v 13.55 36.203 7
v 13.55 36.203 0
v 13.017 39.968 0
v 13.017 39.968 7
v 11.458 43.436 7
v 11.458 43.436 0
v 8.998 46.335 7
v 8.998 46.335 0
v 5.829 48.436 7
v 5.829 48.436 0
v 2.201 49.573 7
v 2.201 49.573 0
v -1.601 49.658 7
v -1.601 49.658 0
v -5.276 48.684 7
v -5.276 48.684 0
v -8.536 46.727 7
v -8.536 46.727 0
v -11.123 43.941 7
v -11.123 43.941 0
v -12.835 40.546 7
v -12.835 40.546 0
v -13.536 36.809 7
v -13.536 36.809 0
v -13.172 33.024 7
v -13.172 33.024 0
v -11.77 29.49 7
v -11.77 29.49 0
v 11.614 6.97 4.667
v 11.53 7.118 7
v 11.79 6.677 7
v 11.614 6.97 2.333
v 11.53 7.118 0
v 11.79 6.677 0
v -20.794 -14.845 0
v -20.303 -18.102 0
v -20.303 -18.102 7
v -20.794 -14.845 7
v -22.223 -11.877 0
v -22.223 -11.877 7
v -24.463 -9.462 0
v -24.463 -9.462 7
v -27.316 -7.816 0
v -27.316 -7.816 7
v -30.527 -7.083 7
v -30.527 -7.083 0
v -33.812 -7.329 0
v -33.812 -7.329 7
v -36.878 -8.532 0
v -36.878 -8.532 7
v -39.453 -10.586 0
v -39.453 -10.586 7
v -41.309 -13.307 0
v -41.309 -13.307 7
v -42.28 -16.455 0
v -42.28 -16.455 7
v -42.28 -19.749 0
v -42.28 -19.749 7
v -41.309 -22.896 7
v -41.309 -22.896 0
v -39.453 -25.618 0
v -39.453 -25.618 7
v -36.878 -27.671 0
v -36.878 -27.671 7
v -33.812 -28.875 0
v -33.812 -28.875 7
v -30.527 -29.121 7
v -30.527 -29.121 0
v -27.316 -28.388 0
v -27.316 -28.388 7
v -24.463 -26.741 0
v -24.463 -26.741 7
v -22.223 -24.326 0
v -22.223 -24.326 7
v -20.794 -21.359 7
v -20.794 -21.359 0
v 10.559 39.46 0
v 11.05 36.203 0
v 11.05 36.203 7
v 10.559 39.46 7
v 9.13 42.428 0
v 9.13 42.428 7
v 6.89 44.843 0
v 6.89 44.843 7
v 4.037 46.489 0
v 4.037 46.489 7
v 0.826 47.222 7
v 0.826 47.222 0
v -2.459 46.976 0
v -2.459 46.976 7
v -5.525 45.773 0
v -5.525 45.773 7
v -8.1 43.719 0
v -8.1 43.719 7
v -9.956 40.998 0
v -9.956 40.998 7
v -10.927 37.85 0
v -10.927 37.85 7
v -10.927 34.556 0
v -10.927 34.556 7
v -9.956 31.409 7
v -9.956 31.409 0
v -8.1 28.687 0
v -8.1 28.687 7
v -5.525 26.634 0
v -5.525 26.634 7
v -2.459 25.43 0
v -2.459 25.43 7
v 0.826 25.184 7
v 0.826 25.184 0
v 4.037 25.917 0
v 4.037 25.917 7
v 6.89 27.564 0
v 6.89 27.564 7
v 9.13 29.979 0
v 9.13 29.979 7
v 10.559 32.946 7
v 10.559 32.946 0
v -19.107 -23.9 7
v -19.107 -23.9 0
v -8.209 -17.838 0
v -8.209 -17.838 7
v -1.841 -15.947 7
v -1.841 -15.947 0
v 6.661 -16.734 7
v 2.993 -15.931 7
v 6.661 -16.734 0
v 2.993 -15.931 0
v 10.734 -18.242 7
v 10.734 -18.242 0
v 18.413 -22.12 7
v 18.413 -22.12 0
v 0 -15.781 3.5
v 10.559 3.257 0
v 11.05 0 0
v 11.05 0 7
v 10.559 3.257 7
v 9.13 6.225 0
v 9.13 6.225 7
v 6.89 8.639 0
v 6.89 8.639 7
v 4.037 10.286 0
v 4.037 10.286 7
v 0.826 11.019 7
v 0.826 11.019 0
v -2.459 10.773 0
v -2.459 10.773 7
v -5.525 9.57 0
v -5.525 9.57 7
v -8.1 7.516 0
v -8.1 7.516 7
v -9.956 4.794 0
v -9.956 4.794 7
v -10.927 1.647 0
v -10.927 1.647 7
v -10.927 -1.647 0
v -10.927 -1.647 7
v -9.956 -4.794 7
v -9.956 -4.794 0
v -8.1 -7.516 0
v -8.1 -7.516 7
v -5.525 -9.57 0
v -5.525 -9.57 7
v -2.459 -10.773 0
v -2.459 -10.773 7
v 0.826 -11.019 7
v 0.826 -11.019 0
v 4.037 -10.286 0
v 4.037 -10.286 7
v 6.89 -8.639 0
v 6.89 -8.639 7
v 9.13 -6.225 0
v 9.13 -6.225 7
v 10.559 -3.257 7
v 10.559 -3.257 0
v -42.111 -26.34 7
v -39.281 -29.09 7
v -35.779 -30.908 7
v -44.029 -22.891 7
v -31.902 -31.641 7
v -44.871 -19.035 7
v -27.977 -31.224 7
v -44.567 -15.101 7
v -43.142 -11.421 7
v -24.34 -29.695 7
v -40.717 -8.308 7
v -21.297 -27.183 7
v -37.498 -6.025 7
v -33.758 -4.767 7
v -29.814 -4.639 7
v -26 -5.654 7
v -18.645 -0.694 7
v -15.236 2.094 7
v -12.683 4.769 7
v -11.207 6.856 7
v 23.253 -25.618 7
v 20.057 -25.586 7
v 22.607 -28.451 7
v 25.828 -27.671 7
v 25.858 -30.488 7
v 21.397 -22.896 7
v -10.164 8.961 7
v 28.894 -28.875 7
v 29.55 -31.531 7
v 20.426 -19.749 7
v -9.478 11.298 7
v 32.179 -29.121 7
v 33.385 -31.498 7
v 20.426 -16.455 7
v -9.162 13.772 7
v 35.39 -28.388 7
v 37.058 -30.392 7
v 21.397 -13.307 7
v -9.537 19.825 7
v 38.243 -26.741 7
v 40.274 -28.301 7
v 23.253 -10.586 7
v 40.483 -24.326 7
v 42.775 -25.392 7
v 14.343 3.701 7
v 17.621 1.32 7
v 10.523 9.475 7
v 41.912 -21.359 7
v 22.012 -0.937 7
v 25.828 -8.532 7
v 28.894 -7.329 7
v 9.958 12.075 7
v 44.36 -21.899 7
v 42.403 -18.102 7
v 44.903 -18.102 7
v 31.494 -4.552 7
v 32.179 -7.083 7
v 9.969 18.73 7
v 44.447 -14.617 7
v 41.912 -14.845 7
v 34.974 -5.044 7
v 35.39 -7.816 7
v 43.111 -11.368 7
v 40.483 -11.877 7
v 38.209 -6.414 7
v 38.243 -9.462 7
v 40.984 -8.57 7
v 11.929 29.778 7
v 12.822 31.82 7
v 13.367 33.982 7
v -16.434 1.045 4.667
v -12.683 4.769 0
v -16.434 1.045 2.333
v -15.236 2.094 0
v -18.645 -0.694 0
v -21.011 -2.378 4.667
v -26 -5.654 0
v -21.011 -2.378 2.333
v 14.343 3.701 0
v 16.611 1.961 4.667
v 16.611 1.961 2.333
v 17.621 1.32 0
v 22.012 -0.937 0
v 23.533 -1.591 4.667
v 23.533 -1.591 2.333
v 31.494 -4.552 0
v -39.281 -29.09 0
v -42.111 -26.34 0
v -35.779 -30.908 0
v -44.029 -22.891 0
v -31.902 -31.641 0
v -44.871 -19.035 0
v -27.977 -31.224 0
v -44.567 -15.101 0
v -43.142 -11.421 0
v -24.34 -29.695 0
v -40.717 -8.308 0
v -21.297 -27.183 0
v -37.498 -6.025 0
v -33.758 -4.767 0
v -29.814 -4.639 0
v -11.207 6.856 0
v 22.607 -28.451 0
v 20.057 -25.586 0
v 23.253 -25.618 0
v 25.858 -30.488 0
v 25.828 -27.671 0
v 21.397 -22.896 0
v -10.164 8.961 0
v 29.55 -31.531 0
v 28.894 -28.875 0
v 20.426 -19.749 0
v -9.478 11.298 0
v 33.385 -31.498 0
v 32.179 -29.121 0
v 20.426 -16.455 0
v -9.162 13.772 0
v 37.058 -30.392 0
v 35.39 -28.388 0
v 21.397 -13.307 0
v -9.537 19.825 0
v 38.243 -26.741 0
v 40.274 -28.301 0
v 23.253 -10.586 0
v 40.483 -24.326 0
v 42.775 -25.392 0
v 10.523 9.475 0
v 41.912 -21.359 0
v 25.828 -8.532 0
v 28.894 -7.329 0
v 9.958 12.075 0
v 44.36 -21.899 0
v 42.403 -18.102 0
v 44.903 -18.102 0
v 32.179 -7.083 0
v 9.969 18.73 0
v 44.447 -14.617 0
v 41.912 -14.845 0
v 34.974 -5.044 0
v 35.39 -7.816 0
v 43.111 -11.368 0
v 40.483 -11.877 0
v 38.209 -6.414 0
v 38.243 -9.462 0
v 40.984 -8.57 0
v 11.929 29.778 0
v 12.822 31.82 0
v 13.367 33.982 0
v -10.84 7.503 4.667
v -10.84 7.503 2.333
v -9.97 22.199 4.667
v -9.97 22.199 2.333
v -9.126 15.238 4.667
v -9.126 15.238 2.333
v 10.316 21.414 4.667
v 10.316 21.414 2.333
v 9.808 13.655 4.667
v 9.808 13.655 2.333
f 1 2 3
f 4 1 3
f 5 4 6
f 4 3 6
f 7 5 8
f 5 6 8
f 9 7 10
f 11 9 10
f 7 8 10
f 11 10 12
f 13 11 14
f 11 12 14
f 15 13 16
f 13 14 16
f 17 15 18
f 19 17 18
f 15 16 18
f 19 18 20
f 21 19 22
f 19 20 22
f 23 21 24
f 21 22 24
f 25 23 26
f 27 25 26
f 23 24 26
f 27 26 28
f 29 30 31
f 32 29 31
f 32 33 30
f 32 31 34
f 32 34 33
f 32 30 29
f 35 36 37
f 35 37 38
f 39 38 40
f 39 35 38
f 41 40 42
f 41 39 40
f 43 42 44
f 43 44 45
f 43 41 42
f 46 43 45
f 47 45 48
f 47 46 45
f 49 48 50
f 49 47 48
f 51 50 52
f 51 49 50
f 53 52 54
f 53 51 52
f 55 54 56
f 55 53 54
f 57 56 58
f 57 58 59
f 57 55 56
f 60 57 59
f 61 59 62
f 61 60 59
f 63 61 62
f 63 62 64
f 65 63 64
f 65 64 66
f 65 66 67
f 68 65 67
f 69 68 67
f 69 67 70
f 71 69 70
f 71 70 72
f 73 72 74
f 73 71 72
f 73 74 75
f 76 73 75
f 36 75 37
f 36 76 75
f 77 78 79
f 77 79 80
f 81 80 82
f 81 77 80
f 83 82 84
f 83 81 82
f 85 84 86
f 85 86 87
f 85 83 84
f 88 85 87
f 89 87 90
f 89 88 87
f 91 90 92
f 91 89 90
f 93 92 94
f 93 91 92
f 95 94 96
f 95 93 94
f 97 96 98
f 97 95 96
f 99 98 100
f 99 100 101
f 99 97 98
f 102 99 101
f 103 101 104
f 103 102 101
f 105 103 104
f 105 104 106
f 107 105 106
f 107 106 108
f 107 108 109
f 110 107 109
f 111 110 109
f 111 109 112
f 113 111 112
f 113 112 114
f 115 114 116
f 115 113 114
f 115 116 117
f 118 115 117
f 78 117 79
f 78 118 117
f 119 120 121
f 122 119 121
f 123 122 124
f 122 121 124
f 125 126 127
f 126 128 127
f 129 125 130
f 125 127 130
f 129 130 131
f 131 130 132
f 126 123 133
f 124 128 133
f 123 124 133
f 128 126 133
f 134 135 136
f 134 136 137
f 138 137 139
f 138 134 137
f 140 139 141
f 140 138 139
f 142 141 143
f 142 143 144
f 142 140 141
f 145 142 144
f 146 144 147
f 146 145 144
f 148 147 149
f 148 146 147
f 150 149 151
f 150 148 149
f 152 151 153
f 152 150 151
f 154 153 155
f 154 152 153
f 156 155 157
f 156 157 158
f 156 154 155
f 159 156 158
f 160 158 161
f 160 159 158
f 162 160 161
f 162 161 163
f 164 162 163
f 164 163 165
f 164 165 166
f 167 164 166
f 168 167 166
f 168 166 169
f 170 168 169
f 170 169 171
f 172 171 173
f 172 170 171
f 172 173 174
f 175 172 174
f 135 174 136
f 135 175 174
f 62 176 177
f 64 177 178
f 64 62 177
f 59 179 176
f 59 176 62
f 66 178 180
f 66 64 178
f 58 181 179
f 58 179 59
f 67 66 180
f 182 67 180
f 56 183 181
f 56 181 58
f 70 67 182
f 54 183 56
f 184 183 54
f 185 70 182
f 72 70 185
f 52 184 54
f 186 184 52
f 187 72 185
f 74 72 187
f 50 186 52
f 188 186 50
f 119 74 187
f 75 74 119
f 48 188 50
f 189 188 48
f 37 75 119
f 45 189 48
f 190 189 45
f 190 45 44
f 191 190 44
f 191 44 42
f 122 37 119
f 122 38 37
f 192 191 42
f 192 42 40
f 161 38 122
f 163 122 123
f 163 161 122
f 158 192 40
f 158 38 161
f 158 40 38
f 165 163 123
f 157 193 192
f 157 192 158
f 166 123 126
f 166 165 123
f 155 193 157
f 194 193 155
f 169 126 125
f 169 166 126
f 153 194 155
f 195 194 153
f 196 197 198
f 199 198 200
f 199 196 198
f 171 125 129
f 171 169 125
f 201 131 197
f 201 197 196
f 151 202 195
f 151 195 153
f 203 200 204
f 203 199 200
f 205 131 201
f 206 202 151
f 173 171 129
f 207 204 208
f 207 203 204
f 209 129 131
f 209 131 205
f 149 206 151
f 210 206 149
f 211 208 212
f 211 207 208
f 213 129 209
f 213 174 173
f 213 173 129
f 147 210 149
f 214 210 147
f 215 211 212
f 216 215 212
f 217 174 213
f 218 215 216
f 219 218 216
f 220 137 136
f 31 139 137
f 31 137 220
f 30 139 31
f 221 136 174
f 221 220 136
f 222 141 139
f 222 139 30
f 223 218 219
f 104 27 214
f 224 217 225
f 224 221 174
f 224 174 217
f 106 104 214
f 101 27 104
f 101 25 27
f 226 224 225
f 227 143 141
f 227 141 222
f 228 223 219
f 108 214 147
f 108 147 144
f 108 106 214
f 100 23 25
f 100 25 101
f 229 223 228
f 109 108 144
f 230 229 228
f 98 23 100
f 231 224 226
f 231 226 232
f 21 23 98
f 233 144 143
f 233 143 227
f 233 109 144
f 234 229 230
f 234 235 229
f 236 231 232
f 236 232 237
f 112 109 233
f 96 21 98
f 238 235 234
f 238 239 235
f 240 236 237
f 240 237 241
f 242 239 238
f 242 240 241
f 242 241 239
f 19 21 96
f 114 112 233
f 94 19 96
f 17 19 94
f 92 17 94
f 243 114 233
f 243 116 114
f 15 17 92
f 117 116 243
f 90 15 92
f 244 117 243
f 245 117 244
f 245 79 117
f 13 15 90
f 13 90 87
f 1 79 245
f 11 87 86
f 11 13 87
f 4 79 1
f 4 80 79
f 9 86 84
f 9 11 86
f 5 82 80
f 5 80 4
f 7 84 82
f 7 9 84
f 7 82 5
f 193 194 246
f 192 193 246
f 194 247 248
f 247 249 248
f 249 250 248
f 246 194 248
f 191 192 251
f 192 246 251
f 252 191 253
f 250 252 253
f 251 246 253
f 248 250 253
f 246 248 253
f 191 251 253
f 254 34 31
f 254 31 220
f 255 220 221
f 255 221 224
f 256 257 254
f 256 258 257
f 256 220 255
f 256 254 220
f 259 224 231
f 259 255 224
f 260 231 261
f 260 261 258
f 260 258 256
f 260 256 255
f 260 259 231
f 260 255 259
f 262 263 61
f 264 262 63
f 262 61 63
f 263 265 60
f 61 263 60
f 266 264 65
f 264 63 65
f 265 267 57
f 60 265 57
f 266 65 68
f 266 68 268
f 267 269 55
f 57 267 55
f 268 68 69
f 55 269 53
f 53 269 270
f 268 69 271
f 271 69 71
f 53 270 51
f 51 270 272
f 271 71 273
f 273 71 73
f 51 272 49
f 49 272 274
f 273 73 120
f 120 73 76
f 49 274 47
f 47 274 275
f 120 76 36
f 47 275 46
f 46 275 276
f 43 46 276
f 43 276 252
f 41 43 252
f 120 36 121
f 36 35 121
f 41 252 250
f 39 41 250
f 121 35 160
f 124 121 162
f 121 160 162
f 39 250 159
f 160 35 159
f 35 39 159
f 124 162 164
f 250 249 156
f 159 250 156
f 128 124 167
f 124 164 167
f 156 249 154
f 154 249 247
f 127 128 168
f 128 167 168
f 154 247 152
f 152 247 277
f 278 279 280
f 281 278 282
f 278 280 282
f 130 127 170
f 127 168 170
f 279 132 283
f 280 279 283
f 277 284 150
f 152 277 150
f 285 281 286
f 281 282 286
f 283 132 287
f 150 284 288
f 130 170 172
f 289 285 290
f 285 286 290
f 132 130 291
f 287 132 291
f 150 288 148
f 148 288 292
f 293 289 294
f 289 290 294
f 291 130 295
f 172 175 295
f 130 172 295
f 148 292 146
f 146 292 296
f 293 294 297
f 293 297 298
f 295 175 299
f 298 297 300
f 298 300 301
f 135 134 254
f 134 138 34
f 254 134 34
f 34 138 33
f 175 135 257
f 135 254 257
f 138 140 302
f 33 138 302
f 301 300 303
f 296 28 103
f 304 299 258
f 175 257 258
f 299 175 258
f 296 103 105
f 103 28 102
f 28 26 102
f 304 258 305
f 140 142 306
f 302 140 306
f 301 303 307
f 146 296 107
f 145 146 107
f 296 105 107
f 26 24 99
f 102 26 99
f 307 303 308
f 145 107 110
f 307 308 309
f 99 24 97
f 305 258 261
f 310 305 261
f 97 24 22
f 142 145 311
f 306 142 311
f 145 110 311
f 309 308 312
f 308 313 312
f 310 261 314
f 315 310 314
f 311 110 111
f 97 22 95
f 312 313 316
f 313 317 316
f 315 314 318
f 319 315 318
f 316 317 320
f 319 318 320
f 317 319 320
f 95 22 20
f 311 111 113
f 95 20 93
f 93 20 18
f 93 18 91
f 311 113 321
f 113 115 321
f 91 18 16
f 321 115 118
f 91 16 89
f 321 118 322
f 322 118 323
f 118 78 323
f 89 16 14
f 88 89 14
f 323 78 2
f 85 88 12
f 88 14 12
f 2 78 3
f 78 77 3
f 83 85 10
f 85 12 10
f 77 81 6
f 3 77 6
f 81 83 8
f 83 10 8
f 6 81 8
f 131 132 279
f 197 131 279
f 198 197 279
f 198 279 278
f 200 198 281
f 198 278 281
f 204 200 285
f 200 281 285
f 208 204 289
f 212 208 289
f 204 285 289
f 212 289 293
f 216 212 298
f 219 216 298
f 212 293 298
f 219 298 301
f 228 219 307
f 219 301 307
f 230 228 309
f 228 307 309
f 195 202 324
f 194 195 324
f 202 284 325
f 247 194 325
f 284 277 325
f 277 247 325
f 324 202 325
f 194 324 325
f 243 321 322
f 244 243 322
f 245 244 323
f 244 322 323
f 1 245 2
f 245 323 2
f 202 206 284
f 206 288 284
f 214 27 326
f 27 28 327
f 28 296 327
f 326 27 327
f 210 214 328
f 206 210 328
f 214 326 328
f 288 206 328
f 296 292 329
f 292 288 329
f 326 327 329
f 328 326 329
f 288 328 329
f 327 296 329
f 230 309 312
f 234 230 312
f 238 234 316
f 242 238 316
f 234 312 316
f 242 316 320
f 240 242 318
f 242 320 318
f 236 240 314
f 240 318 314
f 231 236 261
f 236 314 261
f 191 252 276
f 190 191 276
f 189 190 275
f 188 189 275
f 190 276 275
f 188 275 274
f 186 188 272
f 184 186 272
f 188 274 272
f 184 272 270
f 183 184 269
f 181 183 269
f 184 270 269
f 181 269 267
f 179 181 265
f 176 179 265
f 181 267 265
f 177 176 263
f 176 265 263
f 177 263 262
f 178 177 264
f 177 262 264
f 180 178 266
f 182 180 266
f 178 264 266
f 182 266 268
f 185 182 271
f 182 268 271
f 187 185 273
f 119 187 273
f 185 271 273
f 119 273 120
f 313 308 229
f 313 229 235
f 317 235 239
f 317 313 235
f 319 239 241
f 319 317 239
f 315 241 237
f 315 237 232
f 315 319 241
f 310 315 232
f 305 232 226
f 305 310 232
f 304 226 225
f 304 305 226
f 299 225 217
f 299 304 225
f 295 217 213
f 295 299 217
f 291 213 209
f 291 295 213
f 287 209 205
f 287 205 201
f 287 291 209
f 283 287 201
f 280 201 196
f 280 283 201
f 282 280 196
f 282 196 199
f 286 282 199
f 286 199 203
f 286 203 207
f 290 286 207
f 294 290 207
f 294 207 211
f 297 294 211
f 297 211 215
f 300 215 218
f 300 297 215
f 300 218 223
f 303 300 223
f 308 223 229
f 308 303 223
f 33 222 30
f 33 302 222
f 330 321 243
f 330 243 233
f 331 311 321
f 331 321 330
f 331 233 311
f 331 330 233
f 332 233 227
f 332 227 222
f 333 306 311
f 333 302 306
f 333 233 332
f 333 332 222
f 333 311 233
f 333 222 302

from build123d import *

# Parameters (mm, degrees)
F0_R     = 11.05
F1_DEPTH = 7


with BuildPart() as f1:
    # F0 (on Top) → F1 (new body)
    with BuildSketch(Plane.XY):
        with BuildLine():
            ThreePointArc((-12.6831392694, 4.7686977545), (-2.4234234979, -13.3315234895), (13.55, 0))
            ThreePointArc((13.55, 0), (13.1027192195, 3.4527161853), (11.7904060434, 6.6774864532))
            add(Edge.make_bspline(
                [(11.5297847403, 7.1180449452), (11.6132861066, 6.969341391), (11.7001892822, 6.8225044208), (11.7904060434, 6.6774864532)],
                knots=[0.4974758981, 0.4974758981, 0.4974758981, 0.4974758981, 0.5104096373, 0.5104096373, 0.5104096373, 0.5104096373], degree=3))
            ThreePointArc((11.5297847403, 7.1180449452), (1.1469220688, 13.5013728846), (-10.1639023184, 8.9608922359))
            add(Edge.make_bspline(
                [(-10.1639023184, 8.9608922359), (-10.7500939319, 7.4698745289), (-11.6129235501, 6.081120856), (-12.6831392694, 4.7686977545)],
                knots=[0.4943184599, 0.4943184599, 0.4943184599, 0.4943184599, 0.6210165425, 0.6210165425, 0.6210165425, 0.6210165425], degree=3))
        make_face()
        Circle(F0_R, mode=Mode.SUBTRACT)
        with BuildLine():
            ThreePointArc((11.7904060434, 6.6774864532), (13.1027192195, 3.4527161853), (13.55, 0))
            ThreePointArc((13.55, 0), (-2.4234234979, -13.3315234895), (-12.6831392694, 4.7686977545))
            add(Edge.make_bspline(
                [(-12.6831392694, 4.7686977545), (-15.884403608, 0.8429347549), (-20.9412495964, -2.399862478), (-26.0002209429, -5.6537765206)],
                knots=[0.6210165425, 0.6210165425, 0.6210165425, 0.6210165425, 1, 1, 1, 1], degree=3))
            ThreePointArc((-26.0002209429, -5.6537765206), (-20.0363711479, -10.649419061), (-17.8030151047, -18.1016717106))
            ThreePointArc((-17.8030151047, -18.1016717106), (-18.1329053392, -21.0734048392), (-19.1065129332, -23.9004374898))
            add(Edge.make_bspline(
                [(-19.1065129332, -23.9004374898), (-12.7337335325, -19.9495363252), (-0.2067317894, -12.1959048864), (12.344888234, -18.8150479155), (18.4126389706, -22.1202741428)],
                knots=[0, 0, 0, 0, 0.5079978735, 1, 1, 1, 1], degree=3))
            ThreePointArc((18.4126389706, -22.1202741428), (20.4851117611, -10.0090097929), (31.4943521465, -4.5524088583))
            add(Edge.make_bspline(
                [(11.7904060434, 6.6774864532), (15.2054475833, 1.1880144624), (23.3685436118, -1.6949988805), (31.4943521465, -4.5524088583)],
                knots=[0.5104096373, 0.5104096373, 0.5104096373, 0.5104096373, 1, 1, 1, 1], degree=3))
        make_face()
        with BuildLine():
            ThreePointArc((-10.1639023184, 8.9608922359), (1.1469220688, 13.5013728846), (11.5297847403, 7.1180449452))
            add(Edge.make_bspline(
                [(11.9294824461, 29.7776178927), (10.1390437597, 21.3188304105), (8.3180362773, 12.8376928177), (11.5297847403, 7.1180449452)],
                knots=[0, 0, 0, 0, 0.4974758981, 0.4974758981, 0.4974758981, 0.4974758981], degree=3))
            ThreePointArc((11.9294824461, 29.7776178927), (0.164433974, 22.6543411898), (-11.7700234604, 29.4899949467))
            add(Edge.make_bspline(
                [(-11.7700234604, 29.4899949467), (-9.8007963488, 22.152111828), (-7.8768484836, 14.7781671429), (-10.1639023184, 8.9608922359)],
                knots=[0, 0, 0, 0, 0.4943184599, 0.4943184599, 0.4943184599, 0.4943184599], degree=3))
        make_face()
        with BuildLine():
            ThreePointArc((44.9030151047, -18.1016717106), (40.9841525484, -8.5704760069), (31.4943521465, -4.5524088583))
            ThreePointArc((31.4943521465, -4.5524088583), (20.4851117611, -10.0090097929), (18.4126389706, -22.1202741428))
            ThreePointArc((18.4126389706, -22.1202741428), (33.3853048703, -31.4983988597), (44.9030151047, -18.1016717106))
        make_face()
        with Locations((31.3530151047, -18.1016717106)):
            Circle(F0_R, mode=Mode.SUBTRACT)
        with BuildLine():
            ThreePointArc((-17.8030151047, -18.1016717106), (-20.0363711479, -10.649419061), (-26.0002209429, -5.6537765206))
            ThreePointArc((-26.0002209429, -5.6537765206), (-44.028541405, -22.8905685576), (-19.1065129332, -23.9004374898))
            ThreePointArc((-19.1065129332, -23.9004374898), (-18.1329053392, -21.0734048392), (-17.8030151047, -18.1016717106))
        make_face()
        with Locations((-31.3530151047, -18.1016717106)):
            Circle(F0_R, mode=Mode.SUBTRACT)
        with BuildLine():
            ThreePointArc((-11.7700234604, 29.4899949467), (0.164433974, 22.6543411898), (11.9294824461, 29.7776178927))
            ThreePointArc((11.9294824461, 29.7776178927), (13.1386260154, 32.8898850425), (13.55, 36.2033434212))
            ThreePointArc((13.55, 36.2033434212), (-3.472656196, 49.3007919874), (-11.7700234604, 29.4899949467))
        make_face()
        with Locations((0, 36.2033434212)):
            Circle(F0_R, mode=Mode.SUBTRACT)
    extrude(amount=F1_DEPTH)


solid = f1.part
